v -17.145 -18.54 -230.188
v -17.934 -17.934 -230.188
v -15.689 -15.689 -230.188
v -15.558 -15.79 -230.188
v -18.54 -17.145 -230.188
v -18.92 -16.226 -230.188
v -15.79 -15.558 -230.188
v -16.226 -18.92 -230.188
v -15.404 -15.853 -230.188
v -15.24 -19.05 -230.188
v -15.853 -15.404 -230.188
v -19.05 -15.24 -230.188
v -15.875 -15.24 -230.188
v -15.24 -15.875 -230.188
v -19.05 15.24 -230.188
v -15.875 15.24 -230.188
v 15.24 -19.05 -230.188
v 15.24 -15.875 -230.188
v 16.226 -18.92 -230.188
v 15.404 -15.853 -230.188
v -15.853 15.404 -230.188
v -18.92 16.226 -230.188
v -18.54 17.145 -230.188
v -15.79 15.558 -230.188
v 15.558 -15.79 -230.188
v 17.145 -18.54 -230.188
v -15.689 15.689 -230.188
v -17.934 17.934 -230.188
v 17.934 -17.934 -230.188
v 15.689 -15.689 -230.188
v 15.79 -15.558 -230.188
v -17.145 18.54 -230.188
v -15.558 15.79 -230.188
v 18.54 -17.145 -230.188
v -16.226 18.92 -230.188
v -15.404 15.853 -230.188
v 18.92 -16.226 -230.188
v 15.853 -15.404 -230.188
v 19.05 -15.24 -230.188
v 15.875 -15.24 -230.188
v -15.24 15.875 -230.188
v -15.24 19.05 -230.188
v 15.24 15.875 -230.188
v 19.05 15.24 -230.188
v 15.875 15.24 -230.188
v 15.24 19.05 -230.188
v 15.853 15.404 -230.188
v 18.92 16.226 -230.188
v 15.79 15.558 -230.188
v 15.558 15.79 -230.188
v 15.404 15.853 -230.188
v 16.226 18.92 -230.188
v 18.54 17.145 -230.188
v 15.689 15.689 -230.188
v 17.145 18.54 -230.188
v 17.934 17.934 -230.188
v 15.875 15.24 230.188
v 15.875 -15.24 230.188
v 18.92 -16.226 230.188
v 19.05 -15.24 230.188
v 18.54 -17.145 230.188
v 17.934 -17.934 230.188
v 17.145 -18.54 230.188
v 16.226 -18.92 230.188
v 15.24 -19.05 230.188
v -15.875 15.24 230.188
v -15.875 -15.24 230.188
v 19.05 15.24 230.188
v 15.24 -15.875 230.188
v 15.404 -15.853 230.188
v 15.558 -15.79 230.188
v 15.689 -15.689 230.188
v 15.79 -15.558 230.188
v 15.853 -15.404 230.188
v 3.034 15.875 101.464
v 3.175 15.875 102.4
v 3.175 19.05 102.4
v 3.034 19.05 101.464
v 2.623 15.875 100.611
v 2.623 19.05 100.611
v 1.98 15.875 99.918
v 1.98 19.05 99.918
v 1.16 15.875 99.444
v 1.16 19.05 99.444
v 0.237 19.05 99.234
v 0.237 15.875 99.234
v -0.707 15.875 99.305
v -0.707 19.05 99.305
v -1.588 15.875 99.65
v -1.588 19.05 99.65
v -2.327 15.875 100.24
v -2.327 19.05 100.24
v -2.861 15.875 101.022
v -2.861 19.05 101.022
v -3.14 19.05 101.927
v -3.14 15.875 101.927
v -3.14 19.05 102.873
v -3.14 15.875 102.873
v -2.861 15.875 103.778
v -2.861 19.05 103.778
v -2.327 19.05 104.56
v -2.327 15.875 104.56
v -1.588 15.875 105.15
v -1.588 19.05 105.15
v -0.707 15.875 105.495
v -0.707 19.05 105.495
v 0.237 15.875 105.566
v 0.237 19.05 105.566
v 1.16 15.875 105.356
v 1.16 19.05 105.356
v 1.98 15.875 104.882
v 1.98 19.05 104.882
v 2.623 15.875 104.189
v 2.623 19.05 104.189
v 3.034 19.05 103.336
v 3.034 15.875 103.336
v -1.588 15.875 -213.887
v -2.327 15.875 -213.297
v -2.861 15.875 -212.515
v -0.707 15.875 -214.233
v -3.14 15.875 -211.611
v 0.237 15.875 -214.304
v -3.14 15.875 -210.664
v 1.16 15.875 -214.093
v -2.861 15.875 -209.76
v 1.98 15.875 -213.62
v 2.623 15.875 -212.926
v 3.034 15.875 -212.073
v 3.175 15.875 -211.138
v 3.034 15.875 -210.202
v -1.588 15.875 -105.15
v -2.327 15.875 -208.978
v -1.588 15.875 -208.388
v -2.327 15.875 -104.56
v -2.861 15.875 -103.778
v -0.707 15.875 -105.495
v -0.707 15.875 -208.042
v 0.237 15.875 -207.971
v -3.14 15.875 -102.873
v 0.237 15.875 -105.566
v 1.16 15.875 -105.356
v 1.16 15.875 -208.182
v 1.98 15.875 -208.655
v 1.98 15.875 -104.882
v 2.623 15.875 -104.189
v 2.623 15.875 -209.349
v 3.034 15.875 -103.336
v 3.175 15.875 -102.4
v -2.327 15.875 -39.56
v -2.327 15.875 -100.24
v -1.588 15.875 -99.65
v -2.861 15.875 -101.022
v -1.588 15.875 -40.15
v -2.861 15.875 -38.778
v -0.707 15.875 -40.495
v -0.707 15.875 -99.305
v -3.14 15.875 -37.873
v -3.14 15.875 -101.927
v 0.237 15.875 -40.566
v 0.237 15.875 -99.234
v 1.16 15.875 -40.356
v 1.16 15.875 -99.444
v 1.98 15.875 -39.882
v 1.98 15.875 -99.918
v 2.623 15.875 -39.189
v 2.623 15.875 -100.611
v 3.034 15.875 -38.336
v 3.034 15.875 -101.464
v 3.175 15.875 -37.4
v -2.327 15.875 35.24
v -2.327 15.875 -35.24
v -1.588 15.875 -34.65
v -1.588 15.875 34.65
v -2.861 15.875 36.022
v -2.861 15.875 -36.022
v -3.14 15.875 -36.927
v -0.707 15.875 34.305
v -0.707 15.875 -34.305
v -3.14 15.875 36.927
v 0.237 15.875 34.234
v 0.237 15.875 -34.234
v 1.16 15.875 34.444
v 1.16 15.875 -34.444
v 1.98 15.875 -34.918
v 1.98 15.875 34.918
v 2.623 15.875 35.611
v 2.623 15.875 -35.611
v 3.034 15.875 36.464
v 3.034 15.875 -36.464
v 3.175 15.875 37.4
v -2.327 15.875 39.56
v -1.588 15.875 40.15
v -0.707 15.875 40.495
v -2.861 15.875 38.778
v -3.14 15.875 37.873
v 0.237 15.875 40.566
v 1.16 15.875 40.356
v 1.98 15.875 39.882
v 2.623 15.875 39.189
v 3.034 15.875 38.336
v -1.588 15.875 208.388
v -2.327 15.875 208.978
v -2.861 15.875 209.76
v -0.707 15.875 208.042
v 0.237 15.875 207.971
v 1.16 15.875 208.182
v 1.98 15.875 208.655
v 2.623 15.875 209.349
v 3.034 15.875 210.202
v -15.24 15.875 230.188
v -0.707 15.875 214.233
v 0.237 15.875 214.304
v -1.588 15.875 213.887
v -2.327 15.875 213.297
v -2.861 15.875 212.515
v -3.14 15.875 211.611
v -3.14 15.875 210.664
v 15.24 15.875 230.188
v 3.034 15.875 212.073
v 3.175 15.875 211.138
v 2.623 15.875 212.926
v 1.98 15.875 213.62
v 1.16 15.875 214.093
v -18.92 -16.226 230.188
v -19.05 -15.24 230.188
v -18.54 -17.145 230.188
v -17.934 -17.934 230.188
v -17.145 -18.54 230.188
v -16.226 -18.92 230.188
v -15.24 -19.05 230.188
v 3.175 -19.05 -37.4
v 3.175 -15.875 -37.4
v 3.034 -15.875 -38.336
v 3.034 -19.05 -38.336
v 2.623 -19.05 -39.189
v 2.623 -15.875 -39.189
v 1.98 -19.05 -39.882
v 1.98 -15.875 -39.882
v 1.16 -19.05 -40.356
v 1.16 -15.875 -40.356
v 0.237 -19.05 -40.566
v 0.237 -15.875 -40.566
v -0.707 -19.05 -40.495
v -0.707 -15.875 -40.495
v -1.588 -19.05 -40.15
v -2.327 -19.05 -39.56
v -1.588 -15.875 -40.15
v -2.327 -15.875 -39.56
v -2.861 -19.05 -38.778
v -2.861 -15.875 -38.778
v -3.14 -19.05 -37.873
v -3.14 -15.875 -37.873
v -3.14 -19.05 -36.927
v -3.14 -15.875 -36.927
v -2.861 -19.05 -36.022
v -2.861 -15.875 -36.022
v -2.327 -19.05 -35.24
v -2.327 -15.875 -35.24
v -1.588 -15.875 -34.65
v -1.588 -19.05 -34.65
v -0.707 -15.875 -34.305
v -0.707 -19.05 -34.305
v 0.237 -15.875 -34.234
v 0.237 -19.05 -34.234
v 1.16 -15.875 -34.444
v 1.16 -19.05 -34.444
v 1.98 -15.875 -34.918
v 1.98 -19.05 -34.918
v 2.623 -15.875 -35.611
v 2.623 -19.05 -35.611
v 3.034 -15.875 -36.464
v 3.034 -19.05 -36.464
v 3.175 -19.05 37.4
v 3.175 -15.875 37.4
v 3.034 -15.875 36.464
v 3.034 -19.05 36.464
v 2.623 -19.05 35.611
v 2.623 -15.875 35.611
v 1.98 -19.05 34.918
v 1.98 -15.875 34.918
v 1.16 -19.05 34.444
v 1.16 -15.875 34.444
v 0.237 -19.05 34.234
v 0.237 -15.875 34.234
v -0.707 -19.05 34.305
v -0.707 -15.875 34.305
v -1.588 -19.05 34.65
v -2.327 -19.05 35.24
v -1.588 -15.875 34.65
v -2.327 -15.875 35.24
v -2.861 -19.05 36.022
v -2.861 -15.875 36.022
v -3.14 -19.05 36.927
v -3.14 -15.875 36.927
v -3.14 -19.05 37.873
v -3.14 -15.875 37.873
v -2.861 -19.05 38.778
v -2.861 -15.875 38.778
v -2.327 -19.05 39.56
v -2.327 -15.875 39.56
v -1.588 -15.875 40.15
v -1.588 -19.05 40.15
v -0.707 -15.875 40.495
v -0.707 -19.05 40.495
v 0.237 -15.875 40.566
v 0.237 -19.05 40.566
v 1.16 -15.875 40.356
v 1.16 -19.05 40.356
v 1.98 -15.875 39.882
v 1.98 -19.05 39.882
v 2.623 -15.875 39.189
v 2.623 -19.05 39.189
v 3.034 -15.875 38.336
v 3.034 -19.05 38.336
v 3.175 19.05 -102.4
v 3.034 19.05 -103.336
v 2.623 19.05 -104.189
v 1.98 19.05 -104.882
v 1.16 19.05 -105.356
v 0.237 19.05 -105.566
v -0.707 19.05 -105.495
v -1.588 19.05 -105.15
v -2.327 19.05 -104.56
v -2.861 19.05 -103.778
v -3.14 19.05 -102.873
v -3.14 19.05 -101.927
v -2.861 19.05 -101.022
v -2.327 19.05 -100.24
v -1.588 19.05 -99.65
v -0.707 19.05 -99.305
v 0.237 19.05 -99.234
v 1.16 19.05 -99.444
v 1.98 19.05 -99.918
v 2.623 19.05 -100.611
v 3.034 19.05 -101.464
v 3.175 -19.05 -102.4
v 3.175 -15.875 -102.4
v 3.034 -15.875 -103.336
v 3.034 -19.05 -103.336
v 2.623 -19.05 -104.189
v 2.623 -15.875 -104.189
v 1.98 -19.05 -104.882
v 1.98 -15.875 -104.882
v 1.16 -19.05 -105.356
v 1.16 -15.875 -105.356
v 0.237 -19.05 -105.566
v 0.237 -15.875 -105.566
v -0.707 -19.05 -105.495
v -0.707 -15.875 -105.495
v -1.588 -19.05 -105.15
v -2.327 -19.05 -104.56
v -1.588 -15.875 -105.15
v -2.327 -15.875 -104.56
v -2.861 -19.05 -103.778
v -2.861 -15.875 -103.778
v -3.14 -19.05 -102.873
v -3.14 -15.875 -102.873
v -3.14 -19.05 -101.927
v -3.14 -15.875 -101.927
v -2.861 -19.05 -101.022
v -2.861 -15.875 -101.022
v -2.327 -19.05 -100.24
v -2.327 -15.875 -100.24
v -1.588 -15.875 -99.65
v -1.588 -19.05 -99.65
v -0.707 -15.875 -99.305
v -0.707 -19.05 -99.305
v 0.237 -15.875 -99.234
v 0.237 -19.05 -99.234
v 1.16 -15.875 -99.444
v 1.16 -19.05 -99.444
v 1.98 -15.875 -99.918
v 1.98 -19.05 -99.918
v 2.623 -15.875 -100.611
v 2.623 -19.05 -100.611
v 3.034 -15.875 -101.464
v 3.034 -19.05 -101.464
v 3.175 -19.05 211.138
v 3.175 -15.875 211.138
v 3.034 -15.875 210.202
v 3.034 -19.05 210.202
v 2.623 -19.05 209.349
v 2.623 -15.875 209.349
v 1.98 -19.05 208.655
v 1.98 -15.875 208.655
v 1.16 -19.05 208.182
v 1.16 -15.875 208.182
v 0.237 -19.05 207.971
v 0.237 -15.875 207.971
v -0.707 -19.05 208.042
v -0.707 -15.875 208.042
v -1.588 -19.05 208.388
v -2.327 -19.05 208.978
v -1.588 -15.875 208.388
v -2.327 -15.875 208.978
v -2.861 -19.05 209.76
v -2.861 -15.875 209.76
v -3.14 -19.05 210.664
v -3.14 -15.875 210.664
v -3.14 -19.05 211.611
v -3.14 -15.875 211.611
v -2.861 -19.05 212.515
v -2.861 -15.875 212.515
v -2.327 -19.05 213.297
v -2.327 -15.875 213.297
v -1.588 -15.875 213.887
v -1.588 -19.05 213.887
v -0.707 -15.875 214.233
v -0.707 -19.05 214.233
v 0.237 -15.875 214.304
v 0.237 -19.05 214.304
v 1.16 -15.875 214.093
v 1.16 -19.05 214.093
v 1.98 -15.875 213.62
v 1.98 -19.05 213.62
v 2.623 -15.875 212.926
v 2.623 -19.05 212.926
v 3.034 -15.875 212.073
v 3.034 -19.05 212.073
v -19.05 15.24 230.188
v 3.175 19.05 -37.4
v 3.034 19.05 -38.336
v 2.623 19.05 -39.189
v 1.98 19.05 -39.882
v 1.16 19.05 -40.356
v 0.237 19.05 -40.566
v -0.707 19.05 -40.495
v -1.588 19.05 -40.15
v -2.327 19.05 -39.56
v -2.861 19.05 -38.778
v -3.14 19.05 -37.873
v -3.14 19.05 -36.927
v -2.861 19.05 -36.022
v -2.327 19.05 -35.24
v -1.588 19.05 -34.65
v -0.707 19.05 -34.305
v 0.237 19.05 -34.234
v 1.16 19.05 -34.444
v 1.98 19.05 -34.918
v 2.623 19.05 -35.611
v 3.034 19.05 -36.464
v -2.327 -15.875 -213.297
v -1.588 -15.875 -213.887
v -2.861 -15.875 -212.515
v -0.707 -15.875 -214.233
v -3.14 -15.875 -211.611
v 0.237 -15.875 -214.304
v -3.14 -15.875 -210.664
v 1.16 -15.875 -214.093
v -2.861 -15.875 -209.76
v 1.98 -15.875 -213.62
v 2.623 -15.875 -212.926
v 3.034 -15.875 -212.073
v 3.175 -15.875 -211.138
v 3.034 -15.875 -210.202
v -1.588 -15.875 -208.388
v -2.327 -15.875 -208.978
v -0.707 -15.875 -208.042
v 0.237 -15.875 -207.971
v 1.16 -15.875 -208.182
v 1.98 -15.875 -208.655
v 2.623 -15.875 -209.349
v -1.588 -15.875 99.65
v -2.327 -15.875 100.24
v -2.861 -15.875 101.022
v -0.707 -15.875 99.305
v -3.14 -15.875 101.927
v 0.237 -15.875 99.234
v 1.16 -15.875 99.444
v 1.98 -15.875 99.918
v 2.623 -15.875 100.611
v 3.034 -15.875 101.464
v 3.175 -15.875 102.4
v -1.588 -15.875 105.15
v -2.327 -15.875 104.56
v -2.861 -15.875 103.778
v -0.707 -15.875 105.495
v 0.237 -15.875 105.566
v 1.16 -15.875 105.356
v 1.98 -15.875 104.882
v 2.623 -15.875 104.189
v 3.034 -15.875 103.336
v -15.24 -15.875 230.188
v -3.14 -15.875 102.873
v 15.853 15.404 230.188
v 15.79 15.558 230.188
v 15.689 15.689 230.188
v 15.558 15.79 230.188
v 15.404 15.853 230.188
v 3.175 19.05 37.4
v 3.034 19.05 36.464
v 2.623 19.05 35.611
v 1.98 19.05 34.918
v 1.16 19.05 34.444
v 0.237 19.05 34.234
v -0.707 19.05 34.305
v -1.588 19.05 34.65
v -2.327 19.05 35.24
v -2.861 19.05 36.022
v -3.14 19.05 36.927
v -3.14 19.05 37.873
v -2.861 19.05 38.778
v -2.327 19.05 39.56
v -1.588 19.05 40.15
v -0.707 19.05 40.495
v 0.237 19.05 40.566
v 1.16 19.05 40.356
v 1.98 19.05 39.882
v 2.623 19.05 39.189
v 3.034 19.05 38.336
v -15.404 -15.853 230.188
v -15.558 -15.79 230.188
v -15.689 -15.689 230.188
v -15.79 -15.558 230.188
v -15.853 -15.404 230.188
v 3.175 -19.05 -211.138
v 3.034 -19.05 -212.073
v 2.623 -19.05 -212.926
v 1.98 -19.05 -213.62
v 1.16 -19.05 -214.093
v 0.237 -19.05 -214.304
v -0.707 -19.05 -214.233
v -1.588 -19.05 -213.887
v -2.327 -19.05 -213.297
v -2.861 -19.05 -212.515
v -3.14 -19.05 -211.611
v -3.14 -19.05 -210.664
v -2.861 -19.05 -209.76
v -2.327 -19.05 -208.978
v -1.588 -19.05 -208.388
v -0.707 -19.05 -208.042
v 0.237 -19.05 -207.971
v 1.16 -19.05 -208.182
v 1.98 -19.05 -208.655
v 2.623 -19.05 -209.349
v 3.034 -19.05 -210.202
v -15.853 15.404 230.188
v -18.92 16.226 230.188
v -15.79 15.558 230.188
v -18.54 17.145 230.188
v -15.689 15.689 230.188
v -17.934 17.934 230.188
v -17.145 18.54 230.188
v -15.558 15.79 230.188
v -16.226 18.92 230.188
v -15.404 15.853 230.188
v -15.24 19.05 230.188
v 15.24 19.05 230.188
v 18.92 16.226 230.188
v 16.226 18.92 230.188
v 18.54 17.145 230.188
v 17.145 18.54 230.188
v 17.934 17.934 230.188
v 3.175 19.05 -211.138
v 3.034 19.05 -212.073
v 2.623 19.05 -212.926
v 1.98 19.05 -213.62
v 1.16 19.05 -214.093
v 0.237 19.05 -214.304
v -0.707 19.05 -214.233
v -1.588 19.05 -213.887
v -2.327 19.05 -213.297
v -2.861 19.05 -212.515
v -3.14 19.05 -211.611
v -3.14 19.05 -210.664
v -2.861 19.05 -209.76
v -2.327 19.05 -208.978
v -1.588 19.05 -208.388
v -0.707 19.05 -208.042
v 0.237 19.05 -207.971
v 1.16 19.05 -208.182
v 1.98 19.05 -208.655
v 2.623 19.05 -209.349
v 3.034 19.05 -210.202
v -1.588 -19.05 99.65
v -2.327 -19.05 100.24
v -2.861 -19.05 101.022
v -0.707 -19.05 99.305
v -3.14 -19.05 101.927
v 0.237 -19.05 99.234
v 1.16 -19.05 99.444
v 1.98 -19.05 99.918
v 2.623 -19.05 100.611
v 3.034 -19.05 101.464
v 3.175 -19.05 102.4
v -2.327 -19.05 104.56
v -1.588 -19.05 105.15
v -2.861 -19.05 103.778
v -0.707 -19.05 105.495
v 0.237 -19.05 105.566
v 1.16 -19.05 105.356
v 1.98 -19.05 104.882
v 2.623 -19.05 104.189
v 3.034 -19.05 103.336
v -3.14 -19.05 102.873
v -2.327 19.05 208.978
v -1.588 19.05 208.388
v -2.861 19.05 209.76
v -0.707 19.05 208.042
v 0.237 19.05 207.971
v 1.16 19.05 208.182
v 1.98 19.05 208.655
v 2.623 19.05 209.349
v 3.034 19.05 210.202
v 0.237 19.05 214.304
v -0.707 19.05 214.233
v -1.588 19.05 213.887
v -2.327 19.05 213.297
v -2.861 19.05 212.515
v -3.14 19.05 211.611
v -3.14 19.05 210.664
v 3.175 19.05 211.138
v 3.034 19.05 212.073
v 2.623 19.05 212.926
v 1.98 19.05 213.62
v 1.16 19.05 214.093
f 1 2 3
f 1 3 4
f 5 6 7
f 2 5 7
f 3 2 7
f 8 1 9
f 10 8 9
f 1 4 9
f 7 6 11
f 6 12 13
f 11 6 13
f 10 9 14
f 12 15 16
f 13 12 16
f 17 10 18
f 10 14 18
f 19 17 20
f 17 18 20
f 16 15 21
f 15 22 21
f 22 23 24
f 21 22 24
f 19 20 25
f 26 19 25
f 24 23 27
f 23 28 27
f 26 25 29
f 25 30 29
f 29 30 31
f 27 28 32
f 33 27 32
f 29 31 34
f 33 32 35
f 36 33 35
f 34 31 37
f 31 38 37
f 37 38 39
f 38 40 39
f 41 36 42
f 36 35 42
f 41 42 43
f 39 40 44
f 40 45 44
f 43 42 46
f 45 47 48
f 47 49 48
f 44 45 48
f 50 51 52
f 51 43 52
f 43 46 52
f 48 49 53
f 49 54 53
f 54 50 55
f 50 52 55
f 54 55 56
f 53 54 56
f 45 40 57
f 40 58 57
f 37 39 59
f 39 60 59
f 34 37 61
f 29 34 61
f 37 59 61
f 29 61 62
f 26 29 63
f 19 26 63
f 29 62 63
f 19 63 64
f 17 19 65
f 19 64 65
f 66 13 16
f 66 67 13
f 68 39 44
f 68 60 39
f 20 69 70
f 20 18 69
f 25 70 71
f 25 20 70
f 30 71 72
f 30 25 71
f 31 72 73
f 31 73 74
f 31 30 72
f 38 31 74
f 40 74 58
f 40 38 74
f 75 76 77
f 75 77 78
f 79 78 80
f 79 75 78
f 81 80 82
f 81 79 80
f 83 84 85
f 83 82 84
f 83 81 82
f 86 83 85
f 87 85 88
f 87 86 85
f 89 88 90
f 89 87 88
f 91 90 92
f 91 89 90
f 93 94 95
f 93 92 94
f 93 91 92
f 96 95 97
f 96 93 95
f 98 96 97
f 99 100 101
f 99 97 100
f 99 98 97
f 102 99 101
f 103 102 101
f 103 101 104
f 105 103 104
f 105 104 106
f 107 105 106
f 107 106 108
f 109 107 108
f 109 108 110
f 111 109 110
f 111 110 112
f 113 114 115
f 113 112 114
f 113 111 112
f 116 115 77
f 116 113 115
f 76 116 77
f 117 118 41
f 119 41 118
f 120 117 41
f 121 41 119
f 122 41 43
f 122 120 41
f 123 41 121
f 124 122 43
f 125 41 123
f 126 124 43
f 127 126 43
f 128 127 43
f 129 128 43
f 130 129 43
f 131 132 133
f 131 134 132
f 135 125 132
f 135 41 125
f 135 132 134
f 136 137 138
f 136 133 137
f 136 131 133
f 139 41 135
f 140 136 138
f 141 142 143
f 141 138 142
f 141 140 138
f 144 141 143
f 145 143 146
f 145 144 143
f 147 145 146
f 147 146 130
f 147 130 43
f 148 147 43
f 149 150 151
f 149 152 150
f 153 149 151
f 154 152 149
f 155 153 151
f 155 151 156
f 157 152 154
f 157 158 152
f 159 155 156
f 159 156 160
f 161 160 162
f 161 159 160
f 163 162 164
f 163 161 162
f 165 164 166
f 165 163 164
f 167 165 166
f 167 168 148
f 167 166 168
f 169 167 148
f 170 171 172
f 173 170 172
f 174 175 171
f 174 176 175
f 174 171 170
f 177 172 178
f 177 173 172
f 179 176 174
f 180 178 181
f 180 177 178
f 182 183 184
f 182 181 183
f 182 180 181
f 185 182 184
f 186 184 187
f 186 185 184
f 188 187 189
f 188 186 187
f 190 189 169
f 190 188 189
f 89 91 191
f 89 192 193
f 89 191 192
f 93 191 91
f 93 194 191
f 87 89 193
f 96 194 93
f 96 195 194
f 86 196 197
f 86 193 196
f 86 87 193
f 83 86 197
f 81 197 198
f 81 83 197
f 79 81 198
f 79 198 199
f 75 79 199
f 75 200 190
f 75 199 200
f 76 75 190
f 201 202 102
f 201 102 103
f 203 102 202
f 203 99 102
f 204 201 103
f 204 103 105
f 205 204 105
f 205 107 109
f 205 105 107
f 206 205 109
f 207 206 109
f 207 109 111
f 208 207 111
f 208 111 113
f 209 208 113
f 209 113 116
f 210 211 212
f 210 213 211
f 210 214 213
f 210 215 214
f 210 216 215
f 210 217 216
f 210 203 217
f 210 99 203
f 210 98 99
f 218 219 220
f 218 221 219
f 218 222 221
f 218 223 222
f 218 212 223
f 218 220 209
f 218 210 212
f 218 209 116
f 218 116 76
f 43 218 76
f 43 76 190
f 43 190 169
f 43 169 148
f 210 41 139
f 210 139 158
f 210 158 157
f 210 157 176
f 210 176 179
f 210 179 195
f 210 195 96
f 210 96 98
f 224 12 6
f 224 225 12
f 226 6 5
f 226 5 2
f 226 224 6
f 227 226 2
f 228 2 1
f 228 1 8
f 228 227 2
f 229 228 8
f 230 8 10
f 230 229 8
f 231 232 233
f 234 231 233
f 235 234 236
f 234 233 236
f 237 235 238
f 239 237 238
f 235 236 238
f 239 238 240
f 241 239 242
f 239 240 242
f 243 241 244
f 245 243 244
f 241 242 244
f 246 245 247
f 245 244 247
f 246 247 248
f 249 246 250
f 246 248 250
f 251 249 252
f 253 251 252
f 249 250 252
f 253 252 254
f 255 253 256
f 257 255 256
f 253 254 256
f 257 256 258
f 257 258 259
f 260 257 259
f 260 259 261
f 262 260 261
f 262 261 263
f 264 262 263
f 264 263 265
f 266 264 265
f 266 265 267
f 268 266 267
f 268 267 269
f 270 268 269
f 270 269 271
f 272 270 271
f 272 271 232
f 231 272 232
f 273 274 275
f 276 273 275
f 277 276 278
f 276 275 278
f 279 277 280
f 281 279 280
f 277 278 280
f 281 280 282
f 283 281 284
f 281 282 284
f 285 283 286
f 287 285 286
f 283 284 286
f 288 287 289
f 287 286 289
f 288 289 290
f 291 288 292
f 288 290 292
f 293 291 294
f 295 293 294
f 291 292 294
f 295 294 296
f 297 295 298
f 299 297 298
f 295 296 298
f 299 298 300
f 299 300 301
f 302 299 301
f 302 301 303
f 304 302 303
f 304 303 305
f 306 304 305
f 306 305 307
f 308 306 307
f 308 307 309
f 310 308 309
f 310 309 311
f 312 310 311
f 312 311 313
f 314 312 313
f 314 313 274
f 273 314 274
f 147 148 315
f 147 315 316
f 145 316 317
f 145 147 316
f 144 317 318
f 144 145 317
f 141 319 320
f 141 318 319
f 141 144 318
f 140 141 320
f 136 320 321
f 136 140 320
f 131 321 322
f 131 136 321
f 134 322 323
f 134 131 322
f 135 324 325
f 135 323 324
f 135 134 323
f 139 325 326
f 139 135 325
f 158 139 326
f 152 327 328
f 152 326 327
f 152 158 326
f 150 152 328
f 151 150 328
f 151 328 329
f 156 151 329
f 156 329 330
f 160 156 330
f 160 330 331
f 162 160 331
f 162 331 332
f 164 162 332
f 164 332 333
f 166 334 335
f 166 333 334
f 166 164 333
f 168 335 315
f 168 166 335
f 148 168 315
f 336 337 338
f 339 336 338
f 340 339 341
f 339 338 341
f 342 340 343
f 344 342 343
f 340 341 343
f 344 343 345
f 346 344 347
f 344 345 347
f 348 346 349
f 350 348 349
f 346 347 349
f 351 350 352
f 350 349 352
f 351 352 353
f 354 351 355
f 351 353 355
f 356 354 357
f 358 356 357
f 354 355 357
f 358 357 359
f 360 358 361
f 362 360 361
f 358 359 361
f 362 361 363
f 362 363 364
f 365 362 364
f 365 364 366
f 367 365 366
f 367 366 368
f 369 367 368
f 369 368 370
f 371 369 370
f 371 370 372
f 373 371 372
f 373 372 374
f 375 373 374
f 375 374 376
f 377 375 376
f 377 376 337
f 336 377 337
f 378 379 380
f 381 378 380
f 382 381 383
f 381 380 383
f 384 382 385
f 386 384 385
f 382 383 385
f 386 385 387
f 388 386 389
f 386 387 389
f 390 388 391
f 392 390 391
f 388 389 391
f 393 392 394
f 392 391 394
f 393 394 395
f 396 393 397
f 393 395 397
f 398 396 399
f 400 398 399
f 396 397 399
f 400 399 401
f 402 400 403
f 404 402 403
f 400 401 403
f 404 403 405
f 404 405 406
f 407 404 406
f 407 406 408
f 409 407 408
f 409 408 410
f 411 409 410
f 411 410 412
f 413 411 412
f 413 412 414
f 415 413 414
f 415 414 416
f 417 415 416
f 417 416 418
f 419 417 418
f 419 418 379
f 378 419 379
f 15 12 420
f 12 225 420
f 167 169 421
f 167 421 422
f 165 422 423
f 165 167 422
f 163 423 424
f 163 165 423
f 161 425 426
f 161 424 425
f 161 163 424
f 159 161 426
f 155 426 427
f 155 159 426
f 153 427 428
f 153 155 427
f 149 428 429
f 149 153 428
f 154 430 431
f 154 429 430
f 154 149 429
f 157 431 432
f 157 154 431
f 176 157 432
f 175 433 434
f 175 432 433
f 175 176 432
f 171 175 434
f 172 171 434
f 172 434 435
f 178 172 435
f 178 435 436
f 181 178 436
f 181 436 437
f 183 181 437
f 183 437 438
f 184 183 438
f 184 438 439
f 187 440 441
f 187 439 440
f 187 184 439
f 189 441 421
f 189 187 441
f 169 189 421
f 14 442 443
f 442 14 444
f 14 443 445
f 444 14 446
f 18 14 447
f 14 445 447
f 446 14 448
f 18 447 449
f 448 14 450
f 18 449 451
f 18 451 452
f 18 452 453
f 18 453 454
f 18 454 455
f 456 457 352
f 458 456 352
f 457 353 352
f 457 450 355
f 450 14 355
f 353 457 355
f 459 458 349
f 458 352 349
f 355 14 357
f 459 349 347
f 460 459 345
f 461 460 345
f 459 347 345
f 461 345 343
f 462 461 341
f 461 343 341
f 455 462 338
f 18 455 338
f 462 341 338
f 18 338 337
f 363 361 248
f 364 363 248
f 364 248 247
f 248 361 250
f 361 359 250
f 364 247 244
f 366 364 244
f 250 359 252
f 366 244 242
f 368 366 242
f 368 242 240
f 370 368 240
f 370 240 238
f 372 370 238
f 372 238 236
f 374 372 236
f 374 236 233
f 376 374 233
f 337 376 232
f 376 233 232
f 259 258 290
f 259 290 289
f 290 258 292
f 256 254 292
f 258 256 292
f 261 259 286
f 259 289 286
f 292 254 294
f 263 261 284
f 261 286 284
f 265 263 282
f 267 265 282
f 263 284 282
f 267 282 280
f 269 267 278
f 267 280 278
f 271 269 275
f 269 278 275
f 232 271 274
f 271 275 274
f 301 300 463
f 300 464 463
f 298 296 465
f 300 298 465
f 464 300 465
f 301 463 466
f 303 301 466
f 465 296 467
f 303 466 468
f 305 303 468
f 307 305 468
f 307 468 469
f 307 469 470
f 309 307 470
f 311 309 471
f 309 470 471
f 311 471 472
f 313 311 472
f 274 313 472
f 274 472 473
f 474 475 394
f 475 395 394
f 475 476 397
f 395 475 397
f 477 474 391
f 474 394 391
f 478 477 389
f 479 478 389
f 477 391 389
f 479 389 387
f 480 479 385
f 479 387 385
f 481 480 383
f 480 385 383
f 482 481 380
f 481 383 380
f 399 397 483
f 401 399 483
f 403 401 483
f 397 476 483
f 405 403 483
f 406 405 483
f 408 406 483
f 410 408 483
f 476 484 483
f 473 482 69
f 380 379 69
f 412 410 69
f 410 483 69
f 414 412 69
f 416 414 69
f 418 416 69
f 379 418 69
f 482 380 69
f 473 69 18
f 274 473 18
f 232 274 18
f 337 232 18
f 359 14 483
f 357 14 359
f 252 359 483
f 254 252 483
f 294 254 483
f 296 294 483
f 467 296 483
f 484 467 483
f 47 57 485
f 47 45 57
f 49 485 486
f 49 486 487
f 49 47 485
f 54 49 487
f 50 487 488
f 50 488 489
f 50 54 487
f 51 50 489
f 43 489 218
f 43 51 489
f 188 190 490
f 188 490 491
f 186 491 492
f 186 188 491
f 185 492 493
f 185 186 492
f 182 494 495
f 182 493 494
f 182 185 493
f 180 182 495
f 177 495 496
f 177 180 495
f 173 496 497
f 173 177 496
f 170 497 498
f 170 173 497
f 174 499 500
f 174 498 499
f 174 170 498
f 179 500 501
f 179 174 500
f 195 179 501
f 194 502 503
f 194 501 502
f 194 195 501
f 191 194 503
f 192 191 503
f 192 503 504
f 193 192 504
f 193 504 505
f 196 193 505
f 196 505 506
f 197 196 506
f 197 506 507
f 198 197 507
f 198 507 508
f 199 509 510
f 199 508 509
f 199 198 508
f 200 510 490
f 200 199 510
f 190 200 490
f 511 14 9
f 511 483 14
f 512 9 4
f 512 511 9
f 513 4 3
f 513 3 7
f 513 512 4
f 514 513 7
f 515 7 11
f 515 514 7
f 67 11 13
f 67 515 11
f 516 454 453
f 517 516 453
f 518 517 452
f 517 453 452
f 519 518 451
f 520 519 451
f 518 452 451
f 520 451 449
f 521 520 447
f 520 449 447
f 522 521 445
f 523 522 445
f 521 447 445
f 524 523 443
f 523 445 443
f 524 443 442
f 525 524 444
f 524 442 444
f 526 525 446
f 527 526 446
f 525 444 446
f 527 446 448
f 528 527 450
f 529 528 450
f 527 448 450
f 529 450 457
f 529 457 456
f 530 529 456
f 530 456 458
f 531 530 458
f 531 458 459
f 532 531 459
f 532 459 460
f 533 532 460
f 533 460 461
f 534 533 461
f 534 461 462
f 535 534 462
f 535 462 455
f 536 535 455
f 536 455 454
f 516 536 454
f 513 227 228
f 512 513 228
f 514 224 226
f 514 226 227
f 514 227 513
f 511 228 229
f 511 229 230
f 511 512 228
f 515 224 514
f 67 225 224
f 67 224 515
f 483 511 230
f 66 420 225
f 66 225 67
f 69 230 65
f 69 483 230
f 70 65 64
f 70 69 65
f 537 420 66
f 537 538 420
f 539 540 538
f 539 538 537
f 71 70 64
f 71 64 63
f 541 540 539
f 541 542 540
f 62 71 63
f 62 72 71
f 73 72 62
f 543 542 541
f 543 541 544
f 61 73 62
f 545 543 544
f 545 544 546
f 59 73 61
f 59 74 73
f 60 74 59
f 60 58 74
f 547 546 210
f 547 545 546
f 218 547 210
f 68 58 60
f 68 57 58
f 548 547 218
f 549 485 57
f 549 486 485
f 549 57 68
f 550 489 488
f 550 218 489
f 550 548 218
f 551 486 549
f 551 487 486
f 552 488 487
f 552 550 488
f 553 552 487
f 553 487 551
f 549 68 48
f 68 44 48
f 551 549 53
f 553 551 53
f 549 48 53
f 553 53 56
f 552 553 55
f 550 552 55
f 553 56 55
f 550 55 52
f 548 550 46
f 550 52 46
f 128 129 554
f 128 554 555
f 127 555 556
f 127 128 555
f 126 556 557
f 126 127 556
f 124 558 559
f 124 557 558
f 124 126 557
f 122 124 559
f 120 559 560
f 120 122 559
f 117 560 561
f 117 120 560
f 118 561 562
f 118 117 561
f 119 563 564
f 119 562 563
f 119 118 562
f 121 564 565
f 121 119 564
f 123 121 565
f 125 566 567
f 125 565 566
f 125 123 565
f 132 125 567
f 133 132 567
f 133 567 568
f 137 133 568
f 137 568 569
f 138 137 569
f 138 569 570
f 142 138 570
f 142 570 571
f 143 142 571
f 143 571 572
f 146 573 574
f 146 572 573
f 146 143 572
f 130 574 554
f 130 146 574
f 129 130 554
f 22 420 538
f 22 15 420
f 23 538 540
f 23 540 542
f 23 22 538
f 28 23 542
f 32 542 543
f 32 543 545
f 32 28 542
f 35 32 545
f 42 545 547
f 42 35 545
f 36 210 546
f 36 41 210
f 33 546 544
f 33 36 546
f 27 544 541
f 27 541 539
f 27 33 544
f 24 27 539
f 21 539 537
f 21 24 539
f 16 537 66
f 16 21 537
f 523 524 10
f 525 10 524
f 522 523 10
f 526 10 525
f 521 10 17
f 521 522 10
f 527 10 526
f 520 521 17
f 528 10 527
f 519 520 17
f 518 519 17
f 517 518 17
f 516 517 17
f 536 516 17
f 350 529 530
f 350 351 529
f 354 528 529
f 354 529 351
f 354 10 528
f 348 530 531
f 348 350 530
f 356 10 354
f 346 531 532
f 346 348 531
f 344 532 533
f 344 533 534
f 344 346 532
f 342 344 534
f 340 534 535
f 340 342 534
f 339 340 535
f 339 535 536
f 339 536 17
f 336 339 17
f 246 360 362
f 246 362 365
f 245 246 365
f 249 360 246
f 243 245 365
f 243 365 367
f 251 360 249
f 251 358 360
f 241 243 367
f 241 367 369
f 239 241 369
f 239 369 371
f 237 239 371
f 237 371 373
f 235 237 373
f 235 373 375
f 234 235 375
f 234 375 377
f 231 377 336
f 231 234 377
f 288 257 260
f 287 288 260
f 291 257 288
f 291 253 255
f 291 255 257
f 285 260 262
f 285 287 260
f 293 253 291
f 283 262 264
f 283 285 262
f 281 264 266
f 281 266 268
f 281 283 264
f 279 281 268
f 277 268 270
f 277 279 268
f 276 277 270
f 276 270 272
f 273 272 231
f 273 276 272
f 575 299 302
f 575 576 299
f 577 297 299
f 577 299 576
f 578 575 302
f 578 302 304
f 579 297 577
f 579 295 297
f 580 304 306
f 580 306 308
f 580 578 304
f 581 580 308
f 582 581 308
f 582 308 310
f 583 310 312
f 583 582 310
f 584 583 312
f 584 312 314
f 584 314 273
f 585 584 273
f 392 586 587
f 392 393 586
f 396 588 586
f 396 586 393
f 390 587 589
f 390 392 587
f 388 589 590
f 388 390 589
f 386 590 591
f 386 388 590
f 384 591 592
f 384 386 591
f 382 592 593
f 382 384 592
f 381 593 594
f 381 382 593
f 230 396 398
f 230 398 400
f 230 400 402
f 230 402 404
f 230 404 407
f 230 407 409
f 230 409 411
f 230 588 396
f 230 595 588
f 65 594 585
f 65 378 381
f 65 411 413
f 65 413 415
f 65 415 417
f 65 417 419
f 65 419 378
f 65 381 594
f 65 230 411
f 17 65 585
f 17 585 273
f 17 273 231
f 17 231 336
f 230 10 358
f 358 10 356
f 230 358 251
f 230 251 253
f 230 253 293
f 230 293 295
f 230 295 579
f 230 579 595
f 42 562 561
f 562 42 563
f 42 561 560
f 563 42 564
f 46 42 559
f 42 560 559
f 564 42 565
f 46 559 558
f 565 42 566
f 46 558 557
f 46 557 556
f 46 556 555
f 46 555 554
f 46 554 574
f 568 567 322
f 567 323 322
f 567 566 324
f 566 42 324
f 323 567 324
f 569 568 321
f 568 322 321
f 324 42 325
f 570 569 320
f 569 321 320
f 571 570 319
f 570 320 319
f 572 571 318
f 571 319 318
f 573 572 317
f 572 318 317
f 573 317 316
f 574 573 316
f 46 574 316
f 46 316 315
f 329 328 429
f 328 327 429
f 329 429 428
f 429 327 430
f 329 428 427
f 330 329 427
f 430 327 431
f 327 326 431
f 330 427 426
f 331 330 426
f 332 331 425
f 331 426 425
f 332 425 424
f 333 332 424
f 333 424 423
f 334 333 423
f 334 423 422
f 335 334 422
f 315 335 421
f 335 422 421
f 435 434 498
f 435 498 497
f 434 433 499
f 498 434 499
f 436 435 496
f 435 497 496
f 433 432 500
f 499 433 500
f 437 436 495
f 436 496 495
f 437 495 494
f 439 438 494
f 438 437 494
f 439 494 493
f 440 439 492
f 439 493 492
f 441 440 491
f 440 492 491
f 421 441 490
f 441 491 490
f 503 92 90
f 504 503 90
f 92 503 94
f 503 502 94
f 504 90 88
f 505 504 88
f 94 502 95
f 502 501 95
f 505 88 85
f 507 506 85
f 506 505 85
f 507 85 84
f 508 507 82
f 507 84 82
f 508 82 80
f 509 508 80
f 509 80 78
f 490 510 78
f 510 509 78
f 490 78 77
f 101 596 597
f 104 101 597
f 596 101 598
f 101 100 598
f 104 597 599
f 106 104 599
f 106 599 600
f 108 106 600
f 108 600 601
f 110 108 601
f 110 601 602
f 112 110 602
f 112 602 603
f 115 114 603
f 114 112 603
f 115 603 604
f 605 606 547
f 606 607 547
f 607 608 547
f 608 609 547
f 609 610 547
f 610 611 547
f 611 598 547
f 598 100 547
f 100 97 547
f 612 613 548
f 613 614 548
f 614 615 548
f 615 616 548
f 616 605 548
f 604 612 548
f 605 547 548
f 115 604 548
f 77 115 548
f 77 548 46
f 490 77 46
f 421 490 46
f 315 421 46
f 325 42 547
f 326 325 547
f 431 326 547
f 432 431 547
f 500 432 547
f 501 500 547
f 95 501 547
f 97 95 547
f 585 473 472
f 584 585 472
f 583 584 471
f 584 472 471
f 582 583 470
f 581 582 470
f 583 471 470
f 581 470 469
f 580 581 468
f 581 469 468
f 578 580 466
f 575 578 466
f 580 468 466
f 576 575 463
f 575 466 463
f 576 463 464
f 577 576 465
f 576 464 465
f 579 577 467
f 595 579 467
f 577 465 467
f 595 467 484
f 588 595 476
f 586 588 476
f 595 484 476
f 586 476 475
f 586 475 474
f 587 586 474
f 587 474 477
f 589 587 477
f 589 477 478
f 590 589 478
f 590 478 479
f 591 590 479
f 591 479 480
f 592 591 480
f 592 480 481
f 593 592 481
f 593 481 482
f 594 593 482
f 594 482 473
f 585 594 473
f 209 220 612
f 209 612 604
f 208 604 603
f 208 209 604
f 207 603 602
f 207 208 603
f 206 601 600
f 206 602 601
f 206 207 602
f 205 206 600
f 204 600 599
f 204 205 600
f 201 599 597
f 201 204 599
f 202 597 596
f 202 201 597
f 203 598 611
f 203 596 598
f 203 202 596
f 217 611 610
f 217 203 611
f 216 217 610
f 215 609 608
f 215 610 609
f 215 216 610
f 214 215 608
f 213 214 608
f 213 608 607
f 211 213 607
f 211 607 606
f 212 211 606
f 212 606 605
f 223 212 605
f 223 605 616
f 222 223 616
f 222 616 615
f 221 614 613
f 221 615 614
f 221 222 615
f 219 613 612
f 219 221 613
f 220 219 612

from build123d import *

# Parameters (mm, degrees)
SKETCH1_W               = 38.1
SKETCH1_H               = 38.1
SKETCH1_W_2             = 31.75
SKETCH1_H_2             = 31.75
BOSS_EXTRUDE1_DEPTH     = 230.1875
FILLET1_R               = 3.81
FILLET2_R               = 0.635
SKETCH2_R               = 3.175
CUT_EXTRUDE1_DEPTH      = 20.05
CUT_EXTRUDE1_DEPTH_BACK = 20.05


with BuildPart() as part:
    # Sketch1 → Boss-Extrude1 (new body, symmetric)
    with BuildSketch(Plane.XY):
        Rectangle(SKETCH1_W, SKETCH1_H)
        Rectangle(SKETCH1_W_2, SKETCH1_H_2, mode=Mode.SUBTRACT)
    extrude(amount=BOSS_EXTRUDE1_DEPTH, both=True)

    # Fillet1
    fillet1_edges = [part.edges().sort_by_distance(p)[0] for p in [
        (19.05, -19.05, 0),
        (-19.05, -19.05, 0),
        (-19.05, 19.05, 0),
        (19.05, 19.05, 0),
    ]]
    fillet(fillet1_edges, radius=FILLET1_R)

    # Fillet2
    fillet2_edges = [part.edges().sort_by_distance(p)[0] for p in [
        (15.875, 15.875, 0),
        (-15.875, 15.875, 0),
        (-15.875, -15.875, 0),
        (15.875, -15.875, 0),
    ]]
    fillet(fillet2_edges, radius=FILLET2_R)

    # Sketch2 → Cut-Extrude1 (cut, two sides)
    with BuildSketch(Plane(origin=(0, 0, 0), x_dir=(1, 0, 0), z_dir=(0, 1, 0))) as cut_extrude1_sk:
        with Locations((0, -211.1375)):
            Circle(SKETCH2_R)
        with Locations((0, -102.4)):
            Circle(SKETCH2_R)
        with Locations((0, -37.4)):
            Circle(SKETCH2_R)
        with Locations((0, 37.4)):
            Circle(SKETCH2_R)
        with Locations((0, 102.4)):
            Circle(SKETCH2_R)
        with Locations((0, 211.1375)):
            Circle(SKETCH2_R)
    extrude(amount=CUT_EXTRUDE1_DEPTH, mode=Mode.SUBTRACT)
    extrude(cut_extrude1_sk.sketch, amount=-CUT_EXTRUDE1_DEPTH_BACK, mode=Mode.SUBTRACT)


solid = part.part
